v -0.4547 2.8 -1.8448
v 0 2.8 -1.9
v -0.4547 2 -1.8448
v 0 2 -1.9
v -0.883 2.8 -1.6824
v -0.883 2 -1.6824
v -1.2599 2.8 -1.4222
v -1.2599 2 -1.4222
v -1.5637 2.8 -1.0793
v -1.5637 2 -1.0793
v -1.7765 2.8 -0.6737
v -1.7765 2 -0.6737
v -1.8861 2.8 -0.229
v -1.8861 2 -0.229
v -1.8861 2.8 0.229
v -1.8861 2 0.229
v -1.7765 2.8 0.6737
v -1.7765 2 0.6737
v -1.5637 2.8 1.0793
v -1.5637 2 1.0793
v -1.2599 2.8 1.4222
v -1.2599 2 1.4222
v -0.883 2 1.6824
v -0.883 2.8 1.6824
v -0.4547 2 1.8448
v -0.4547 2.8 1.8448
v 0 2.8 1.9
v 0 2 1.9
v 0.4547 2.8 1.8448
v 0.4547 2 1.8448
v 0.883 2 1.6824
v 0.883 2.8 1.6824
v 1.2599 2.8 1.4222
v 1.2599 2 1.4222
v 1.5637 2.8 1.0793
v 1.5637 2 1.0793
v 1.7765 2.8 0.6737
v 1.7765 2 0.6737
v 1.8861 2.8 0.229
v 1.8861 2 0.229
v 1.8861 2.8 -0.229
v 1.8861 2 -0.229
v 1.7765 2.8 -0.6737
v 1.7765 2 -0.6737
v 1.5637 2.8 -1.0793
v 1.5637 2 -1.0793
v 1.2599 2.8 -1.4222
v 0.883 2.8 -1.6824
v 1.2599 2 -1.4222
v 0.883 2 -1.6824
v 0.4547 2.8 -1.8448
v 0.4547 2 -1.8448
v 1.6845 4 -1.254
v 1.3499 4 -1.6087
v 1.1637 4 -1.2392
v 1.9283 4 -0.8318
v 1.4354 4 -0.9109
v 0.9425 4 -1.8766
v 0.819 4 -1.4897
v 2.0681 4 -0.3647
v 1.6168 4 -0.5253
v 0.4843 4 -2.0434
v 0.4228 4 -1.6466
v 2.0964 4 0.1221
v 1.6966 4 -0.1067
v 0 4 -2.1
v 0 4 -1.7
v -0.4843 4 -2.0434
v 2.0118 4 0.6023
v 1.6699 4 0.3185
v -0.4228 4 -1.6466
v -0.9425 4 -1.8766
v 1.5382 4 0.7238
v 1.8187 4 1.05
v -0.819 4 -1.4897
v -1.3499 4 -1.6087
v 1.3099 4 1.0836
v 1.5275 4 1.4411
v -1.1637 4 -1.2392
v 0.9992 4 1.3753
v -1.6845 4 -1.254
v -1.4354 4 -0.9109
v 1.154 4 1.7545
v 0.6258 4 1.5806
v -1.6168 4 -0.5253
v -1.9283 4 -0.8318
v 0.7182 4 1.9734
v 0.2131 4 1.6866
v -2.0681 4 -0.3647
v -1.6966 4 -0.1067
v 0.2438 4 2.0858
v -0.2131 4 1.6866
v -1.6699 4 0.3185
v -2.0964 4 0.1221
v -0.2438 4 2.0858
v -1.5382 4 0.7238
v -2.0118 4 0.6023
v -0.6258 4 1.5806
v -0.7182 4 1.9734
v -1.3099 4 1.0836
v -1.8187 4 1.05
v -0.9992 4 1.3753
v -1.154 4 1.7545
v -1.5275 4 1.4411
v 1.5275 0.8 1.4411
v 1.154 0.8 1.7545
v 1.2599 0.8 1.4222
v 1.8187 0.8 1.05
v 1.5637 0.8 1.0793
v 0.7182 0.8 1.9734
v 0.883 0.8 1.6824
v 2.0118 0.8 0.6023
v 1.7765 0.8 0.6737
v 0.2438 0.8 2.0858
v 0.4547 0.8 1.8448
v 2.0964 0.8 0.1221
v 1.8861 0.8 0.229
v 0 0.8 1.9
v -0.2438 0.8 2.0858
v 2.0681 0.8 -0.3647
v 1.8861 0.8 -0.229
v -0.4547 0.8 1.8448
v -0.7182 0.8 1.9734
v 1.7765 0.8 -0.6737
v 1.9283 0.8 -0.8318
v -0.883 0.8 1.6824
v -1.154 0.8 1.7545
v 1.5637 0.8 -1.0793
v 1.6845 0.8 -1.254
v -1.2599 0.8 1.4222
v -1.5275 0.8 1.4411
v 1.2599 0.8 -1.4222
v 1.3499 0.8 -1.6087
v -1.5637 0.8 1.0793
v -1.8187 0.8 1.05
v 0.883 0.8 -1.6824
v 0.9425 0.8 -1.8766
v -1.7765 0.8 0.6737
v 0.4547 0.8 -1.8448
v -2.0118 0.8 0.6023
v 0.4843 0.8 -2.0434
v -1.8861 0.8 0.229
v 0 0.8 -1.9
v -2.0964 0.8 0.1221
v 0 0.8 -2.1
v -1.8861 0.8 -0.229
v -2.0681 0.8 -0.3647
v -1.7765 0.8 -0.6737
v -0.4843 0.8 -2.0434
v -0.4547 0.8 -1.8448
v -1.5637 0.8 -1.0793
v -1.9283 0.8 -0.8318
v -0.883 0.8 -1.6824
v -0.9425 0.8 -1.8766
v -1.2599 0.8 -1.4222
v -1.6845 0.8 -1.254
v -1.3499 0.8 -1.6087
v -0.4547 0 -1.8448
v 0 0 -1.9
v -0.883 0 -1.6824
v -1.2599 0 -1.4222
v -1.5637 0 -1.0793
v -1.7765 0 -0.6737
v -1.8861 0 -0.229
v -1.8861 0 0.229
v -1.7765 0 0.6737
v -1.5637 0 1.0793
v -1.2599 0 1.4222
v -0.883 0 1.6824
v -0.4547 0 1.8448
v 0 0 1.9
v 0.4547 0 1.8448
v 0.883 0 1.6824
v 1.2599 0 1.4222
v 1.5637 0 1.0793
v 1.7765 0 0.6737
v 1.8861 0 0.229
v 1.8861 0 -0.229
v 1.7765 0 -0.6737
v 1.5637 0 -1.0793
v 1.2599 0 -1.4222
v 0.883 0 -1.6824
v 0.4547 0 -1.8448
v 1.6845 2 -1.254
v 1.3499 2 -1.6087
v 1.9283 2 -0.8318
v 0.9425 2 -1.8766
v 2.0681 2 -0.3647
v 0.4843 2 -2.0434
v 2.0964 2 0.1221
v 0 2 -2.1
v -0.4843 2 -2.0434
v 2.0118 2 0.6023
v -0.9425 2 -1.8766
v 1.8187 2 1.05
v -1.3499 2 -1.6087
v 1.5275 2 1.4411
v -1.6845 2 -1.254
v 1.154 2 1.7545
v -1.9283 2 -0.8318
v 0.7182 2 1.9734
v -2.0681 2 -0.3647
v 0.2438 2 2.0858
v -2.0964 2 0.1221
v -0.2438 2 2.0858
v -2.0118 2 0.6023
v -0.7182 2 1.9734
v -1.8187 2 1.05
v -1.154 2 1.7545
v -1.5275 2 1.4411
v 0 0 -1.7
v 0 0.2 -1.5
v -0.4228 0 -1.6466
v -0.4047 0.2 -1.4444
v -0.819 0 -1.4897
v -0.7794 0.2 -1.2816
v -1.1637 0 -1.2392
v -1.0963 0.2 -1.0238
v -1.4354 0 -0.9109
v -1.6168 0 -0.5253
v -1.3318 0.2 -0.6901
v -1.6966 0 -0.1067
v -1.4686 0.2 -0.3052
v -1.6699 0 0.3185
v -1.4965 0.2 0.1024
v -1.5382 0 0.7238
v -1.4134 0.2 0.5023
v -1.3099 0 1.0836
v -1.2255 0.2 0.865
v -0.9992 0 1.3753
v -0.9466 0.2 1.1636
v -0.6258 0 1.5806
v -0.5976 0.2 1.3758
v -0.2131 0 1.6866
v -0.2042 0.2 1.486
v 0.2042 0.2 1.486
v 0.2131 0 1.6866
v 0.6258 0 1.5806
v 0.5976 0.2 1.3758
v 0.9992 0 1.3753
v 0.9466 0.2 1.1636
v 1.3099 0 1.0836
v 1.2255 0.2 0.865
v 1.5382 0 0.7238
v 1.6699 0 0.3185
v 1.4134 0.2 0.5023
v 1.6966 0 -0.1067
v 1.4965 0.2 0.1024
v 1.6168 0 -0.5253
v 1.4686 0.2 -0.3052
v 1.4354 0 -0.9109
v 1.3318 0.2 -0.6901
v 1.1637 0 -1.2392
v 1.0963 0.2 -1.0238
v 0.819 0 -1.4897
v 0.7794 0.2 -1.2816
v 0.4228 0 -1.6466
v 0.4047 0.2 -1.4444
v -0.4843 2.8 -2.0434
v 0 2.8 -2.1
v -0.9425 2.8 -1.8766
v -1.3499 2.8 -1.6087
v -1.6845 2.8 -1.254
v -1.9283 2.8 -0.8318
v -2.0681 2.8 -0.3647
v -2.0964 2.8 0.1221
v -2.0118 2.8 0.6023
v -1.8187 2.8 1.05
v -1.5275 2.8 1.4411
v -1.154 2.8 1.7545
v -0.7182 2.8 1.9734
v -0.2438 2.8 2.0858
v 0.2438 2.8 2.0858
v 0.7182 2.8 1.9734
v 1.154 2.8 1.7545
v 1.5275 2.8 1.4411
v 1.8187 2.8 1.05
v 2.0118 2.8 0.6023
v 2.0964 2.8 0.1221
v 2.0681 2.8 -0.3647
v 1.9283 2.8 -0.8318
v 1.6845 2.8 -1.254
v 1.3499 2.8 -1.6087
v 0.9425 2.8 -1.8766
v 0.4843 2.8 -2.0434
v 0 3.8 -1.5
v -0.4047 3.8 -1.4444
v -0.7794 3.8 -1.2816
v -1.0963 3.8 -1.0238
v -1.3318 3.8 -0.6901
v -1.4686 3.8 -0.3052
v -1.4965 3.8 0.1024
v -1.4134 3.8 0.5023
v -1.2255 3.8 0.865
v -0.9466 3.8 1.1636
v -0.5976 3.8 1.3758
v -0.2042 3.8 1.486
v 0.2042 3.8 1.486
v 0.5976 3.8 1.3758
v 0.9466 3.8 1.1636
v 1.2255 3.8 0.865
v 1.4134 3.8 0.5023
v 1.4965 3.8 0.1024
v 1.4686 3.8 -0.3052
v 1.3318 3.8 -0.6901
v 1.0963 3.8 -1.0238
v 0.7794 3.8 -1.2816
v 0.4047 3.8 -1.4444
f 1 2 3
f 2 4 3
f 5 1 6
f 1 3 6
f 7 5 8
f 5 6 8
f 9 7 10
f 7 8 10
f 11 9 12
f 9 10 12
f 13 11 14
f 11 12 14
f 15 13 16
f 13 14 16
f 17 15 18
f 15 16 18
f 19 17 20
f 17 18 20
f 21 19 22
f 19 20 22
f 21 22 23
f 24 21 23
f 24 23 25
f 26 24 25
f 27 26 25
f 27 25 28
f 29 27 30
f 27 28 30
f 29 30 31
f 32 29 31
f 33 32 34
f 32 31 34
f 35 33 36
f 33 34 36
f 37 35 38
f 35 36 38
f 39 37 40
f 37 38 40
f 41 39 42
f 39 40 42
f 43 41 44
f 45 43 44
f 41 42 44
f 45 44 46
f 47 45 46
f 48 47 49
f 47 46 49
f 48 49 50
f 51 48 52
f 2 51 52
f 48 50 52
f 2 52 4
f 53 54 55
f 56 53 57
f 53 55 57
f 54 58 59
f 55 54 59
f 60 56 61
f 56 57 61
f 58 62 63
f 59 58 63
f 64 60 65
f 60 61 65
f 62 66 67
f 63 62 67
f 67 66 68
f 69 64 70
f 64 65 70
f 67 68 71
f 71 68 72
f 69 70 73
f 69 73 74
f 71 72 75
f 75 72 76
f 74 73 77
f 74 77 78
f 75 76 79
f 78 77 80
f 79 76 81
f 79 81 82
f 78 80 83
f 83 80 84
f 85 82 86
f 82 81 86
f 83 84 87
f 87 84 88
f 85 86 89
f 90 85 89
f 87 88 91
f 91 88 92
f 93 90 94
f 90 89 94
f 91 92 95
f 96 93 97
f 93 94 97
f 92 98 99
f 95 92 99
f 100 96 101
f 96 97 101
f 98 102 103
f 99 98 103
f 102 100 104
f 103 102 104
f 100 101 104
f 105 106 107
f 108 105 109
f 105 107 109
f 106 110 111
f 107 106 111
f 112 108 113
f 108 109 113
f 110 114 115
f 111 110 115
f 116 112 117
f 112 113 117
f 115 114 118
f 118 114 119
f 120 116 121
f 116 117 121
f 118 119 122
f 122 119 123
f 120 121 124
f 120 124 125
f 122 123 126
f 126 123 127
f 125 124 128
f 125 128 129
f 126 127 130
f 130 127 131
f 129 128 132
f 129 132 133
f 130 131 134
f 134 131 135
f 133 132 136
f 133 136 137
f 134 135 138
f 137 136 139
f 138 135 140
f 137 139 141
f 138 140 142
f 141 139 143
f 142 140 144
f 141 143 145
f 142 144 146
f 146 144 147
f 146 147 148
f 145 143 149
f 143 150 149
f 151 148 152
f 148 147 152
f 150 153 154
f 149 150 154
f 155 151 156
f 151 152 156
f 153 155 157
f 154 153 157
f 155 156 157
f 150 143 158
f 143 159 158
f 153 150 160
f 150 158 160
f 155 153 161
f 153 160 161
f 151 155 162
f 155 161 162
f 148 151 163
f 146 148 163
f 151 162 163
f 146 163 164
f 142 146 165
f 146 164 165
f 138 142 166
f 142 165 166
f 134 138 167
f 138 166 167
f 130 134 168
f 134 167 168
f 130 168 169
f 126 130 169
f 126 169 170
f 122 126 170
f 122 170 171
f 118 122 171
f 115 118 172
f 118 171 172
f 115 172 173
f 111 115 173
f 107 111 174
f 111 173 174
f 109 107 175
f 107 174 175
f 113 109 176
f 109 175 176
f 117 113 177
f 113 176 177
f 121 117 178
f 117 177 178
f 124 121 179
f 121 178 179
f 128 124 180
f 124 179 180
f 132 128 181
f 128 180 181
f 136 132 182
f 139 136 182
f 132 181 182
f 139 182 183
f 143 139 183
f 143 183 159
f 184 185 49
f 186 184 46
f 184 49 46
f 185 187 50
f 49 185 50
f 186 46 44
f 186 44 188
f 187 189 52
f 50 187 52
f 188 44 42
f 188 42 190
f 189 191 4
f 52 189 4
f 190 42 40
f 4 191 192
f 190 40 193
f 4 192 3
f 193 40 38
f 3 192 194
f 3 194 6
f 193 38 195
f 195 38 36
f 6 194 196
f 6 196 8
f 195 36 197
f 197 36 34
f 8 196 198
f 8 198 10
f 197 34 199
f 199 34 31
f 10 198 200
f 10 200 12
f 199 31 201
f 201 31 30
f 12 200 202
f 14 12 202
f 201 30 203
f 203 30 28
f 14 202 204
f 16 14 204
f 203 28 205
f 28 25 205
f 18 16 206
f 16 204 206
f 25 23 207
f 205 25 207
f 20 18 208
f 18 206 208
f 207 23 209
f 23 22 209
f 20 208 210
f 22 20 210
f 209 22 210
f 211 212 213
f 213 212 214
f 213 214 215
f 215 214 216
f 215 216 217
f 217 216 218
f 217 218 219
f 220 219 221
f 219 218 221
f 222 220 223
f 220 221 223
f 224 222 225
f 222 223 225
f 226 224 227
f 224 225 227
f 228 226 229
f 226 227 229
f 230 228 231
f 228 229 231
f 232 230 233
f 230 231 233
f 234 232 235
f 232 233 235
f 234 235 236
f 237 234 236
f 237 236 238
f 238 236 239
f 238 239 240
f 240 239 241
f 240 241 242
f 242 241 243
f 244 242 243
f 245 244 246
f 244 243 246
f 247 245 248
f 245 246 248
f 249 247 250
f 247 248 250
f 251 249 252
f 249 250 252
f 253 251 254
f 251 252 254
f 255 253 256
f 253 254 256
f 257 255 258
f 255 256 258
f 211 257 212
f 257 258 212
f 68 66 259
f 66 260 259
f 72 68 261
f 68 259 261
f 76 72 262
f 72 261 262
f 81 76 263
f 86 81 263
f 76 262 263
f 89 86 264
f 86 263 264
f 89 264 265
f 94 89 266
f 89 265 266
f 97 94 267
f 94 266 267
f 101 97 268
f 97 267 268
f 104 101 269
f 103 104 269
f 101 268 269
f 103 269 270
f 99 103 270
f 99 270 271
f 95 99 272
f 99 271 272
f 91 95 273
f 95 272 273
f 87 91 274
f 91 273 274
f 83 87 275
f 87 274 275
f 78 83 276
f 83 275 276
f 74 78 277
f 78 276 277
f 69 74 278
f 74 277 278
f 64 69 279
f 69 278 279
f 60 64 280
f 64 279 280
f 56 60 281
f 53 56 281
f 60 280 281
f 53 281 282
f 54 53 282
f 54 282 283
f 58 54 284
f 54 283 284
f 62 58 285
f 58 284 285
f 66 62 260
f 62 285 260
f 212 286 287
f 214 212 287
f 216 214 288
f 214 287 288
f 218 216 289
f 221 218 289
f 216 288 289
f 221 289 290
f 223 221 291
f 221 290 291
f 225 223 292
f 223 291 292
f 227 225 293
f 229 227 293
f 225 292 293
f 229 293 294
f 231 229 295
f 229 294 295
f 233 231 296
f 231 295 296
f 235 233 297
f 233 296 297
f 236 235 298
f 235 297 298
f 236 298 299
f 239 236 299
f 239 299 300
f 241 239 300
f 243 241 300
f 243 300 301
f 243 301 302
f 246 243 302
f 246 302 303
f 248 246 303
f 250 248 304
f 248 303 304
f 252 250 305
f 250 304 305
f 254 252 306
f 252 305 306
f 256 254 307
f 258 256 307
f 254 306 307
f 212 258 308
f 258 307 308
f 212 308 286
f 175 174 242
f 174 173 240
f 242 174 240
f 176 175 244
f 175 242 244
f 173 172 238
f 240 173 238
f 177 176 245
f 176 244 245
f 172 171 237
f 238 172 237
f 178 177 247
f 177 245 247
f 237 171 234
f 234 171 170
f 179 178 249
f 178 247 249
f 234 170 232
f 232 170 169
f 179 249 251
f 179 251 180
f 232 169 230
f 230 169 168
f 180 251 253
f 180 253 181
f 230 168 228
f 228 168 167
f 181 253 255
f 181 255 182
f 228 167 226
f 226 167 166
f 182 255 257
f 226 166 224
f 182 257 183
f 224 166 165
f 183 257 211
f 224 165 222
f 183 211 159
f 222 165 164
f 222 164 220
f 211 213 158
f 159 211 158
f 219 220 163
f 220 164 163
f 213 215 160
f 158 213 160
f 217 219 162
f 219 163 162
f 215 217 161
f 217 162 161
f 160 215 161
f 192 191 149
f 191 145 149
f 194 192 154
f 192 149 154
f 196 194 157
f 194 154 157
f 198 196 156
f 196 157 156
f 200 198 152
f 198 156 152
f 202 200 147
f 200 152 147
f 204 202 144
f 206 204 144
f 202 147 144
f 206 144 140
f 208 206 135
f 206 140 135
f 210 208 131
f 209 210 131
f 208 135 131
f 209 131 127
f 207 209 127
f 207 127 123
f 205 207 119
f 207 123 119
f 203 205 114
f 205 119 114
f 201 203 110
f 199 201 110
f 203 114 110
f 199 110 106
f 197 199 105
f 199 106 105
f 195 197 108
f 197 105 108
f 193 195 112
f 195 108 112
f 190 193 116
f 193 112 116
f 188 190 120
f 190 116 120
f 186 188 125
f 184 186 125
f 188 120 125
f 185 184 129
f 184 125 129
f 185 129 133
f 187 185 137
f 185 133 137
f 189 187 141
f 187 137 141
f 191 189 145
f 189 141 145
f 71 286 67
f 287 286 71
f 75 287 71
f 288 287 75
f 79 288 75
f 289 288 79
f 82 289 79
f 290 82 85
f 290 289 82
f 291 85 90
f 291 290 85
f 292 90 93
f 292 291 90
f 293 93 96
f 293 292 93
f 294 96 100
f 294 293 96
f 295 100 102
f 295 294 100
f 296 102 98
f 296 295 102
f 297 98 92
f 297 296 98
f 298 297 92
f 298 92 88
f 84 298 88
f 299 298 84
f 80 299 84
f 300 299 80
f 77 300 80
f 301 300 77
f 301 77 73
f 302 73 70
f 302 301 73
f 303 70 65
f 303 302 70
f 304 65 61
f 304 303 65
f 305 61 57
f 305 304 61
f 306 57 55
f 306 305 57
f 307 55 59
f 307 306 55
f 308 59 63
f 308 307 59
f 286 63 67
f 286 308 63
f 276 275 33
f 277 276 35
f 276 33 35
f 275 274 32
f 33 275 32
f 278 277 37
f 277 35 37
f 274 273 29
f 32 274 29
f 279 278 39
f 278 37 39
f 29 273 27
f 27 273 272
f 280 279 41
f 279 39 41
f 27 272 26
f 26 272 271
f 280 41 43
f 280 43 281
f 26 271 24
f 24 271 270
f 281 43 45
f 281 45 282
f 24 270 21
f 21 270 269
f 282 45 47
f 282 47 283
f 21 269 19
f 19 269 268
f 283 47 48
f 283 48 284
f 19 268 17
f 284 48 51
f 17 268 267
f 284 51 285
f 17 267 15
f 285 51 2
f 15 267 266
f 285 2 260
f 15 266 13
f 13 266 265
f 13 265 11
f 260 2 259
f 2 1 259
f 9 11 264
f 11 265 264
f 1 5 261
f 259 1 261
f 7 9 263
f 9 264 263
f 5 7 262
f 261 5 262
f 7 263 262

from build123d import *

# Parameters (mm, degrees)
CHAMFER_1_SIZE = 0.2


with BuildPart() as part:
    # 草图1 → 旋转1 (revolve)
    with BuildSketch(Plane.XY, mode=Mode.PRIVATE) as revolve_1_sk:
        Polygon((1.5, 4), (2.1, 4), (2.1, 2.8), (1.9, 2.8), (1.9, 2), (2.1, 2), (2.1, 0.8), (1.9, 0.8), (1.9, 0), (1.5, 0), align=None)
    revolve(revolve_1_sk.sketch.rotate(Axis((0, 0, 0), (0, 1, 0)), 90), axis=Axis((0, 0, 0), (0, 1, 0)))

    # 倒角1
    chamfer_1_edges = [part.edges().sort_by_distance(p)[0] for p in [
        (0, 4, 1.5),
        (0, 0, 1.5),
    ]]
    chamfer(chamfer_1_edges, length=CHAMFER_1_SIZE)


solid = part.part
